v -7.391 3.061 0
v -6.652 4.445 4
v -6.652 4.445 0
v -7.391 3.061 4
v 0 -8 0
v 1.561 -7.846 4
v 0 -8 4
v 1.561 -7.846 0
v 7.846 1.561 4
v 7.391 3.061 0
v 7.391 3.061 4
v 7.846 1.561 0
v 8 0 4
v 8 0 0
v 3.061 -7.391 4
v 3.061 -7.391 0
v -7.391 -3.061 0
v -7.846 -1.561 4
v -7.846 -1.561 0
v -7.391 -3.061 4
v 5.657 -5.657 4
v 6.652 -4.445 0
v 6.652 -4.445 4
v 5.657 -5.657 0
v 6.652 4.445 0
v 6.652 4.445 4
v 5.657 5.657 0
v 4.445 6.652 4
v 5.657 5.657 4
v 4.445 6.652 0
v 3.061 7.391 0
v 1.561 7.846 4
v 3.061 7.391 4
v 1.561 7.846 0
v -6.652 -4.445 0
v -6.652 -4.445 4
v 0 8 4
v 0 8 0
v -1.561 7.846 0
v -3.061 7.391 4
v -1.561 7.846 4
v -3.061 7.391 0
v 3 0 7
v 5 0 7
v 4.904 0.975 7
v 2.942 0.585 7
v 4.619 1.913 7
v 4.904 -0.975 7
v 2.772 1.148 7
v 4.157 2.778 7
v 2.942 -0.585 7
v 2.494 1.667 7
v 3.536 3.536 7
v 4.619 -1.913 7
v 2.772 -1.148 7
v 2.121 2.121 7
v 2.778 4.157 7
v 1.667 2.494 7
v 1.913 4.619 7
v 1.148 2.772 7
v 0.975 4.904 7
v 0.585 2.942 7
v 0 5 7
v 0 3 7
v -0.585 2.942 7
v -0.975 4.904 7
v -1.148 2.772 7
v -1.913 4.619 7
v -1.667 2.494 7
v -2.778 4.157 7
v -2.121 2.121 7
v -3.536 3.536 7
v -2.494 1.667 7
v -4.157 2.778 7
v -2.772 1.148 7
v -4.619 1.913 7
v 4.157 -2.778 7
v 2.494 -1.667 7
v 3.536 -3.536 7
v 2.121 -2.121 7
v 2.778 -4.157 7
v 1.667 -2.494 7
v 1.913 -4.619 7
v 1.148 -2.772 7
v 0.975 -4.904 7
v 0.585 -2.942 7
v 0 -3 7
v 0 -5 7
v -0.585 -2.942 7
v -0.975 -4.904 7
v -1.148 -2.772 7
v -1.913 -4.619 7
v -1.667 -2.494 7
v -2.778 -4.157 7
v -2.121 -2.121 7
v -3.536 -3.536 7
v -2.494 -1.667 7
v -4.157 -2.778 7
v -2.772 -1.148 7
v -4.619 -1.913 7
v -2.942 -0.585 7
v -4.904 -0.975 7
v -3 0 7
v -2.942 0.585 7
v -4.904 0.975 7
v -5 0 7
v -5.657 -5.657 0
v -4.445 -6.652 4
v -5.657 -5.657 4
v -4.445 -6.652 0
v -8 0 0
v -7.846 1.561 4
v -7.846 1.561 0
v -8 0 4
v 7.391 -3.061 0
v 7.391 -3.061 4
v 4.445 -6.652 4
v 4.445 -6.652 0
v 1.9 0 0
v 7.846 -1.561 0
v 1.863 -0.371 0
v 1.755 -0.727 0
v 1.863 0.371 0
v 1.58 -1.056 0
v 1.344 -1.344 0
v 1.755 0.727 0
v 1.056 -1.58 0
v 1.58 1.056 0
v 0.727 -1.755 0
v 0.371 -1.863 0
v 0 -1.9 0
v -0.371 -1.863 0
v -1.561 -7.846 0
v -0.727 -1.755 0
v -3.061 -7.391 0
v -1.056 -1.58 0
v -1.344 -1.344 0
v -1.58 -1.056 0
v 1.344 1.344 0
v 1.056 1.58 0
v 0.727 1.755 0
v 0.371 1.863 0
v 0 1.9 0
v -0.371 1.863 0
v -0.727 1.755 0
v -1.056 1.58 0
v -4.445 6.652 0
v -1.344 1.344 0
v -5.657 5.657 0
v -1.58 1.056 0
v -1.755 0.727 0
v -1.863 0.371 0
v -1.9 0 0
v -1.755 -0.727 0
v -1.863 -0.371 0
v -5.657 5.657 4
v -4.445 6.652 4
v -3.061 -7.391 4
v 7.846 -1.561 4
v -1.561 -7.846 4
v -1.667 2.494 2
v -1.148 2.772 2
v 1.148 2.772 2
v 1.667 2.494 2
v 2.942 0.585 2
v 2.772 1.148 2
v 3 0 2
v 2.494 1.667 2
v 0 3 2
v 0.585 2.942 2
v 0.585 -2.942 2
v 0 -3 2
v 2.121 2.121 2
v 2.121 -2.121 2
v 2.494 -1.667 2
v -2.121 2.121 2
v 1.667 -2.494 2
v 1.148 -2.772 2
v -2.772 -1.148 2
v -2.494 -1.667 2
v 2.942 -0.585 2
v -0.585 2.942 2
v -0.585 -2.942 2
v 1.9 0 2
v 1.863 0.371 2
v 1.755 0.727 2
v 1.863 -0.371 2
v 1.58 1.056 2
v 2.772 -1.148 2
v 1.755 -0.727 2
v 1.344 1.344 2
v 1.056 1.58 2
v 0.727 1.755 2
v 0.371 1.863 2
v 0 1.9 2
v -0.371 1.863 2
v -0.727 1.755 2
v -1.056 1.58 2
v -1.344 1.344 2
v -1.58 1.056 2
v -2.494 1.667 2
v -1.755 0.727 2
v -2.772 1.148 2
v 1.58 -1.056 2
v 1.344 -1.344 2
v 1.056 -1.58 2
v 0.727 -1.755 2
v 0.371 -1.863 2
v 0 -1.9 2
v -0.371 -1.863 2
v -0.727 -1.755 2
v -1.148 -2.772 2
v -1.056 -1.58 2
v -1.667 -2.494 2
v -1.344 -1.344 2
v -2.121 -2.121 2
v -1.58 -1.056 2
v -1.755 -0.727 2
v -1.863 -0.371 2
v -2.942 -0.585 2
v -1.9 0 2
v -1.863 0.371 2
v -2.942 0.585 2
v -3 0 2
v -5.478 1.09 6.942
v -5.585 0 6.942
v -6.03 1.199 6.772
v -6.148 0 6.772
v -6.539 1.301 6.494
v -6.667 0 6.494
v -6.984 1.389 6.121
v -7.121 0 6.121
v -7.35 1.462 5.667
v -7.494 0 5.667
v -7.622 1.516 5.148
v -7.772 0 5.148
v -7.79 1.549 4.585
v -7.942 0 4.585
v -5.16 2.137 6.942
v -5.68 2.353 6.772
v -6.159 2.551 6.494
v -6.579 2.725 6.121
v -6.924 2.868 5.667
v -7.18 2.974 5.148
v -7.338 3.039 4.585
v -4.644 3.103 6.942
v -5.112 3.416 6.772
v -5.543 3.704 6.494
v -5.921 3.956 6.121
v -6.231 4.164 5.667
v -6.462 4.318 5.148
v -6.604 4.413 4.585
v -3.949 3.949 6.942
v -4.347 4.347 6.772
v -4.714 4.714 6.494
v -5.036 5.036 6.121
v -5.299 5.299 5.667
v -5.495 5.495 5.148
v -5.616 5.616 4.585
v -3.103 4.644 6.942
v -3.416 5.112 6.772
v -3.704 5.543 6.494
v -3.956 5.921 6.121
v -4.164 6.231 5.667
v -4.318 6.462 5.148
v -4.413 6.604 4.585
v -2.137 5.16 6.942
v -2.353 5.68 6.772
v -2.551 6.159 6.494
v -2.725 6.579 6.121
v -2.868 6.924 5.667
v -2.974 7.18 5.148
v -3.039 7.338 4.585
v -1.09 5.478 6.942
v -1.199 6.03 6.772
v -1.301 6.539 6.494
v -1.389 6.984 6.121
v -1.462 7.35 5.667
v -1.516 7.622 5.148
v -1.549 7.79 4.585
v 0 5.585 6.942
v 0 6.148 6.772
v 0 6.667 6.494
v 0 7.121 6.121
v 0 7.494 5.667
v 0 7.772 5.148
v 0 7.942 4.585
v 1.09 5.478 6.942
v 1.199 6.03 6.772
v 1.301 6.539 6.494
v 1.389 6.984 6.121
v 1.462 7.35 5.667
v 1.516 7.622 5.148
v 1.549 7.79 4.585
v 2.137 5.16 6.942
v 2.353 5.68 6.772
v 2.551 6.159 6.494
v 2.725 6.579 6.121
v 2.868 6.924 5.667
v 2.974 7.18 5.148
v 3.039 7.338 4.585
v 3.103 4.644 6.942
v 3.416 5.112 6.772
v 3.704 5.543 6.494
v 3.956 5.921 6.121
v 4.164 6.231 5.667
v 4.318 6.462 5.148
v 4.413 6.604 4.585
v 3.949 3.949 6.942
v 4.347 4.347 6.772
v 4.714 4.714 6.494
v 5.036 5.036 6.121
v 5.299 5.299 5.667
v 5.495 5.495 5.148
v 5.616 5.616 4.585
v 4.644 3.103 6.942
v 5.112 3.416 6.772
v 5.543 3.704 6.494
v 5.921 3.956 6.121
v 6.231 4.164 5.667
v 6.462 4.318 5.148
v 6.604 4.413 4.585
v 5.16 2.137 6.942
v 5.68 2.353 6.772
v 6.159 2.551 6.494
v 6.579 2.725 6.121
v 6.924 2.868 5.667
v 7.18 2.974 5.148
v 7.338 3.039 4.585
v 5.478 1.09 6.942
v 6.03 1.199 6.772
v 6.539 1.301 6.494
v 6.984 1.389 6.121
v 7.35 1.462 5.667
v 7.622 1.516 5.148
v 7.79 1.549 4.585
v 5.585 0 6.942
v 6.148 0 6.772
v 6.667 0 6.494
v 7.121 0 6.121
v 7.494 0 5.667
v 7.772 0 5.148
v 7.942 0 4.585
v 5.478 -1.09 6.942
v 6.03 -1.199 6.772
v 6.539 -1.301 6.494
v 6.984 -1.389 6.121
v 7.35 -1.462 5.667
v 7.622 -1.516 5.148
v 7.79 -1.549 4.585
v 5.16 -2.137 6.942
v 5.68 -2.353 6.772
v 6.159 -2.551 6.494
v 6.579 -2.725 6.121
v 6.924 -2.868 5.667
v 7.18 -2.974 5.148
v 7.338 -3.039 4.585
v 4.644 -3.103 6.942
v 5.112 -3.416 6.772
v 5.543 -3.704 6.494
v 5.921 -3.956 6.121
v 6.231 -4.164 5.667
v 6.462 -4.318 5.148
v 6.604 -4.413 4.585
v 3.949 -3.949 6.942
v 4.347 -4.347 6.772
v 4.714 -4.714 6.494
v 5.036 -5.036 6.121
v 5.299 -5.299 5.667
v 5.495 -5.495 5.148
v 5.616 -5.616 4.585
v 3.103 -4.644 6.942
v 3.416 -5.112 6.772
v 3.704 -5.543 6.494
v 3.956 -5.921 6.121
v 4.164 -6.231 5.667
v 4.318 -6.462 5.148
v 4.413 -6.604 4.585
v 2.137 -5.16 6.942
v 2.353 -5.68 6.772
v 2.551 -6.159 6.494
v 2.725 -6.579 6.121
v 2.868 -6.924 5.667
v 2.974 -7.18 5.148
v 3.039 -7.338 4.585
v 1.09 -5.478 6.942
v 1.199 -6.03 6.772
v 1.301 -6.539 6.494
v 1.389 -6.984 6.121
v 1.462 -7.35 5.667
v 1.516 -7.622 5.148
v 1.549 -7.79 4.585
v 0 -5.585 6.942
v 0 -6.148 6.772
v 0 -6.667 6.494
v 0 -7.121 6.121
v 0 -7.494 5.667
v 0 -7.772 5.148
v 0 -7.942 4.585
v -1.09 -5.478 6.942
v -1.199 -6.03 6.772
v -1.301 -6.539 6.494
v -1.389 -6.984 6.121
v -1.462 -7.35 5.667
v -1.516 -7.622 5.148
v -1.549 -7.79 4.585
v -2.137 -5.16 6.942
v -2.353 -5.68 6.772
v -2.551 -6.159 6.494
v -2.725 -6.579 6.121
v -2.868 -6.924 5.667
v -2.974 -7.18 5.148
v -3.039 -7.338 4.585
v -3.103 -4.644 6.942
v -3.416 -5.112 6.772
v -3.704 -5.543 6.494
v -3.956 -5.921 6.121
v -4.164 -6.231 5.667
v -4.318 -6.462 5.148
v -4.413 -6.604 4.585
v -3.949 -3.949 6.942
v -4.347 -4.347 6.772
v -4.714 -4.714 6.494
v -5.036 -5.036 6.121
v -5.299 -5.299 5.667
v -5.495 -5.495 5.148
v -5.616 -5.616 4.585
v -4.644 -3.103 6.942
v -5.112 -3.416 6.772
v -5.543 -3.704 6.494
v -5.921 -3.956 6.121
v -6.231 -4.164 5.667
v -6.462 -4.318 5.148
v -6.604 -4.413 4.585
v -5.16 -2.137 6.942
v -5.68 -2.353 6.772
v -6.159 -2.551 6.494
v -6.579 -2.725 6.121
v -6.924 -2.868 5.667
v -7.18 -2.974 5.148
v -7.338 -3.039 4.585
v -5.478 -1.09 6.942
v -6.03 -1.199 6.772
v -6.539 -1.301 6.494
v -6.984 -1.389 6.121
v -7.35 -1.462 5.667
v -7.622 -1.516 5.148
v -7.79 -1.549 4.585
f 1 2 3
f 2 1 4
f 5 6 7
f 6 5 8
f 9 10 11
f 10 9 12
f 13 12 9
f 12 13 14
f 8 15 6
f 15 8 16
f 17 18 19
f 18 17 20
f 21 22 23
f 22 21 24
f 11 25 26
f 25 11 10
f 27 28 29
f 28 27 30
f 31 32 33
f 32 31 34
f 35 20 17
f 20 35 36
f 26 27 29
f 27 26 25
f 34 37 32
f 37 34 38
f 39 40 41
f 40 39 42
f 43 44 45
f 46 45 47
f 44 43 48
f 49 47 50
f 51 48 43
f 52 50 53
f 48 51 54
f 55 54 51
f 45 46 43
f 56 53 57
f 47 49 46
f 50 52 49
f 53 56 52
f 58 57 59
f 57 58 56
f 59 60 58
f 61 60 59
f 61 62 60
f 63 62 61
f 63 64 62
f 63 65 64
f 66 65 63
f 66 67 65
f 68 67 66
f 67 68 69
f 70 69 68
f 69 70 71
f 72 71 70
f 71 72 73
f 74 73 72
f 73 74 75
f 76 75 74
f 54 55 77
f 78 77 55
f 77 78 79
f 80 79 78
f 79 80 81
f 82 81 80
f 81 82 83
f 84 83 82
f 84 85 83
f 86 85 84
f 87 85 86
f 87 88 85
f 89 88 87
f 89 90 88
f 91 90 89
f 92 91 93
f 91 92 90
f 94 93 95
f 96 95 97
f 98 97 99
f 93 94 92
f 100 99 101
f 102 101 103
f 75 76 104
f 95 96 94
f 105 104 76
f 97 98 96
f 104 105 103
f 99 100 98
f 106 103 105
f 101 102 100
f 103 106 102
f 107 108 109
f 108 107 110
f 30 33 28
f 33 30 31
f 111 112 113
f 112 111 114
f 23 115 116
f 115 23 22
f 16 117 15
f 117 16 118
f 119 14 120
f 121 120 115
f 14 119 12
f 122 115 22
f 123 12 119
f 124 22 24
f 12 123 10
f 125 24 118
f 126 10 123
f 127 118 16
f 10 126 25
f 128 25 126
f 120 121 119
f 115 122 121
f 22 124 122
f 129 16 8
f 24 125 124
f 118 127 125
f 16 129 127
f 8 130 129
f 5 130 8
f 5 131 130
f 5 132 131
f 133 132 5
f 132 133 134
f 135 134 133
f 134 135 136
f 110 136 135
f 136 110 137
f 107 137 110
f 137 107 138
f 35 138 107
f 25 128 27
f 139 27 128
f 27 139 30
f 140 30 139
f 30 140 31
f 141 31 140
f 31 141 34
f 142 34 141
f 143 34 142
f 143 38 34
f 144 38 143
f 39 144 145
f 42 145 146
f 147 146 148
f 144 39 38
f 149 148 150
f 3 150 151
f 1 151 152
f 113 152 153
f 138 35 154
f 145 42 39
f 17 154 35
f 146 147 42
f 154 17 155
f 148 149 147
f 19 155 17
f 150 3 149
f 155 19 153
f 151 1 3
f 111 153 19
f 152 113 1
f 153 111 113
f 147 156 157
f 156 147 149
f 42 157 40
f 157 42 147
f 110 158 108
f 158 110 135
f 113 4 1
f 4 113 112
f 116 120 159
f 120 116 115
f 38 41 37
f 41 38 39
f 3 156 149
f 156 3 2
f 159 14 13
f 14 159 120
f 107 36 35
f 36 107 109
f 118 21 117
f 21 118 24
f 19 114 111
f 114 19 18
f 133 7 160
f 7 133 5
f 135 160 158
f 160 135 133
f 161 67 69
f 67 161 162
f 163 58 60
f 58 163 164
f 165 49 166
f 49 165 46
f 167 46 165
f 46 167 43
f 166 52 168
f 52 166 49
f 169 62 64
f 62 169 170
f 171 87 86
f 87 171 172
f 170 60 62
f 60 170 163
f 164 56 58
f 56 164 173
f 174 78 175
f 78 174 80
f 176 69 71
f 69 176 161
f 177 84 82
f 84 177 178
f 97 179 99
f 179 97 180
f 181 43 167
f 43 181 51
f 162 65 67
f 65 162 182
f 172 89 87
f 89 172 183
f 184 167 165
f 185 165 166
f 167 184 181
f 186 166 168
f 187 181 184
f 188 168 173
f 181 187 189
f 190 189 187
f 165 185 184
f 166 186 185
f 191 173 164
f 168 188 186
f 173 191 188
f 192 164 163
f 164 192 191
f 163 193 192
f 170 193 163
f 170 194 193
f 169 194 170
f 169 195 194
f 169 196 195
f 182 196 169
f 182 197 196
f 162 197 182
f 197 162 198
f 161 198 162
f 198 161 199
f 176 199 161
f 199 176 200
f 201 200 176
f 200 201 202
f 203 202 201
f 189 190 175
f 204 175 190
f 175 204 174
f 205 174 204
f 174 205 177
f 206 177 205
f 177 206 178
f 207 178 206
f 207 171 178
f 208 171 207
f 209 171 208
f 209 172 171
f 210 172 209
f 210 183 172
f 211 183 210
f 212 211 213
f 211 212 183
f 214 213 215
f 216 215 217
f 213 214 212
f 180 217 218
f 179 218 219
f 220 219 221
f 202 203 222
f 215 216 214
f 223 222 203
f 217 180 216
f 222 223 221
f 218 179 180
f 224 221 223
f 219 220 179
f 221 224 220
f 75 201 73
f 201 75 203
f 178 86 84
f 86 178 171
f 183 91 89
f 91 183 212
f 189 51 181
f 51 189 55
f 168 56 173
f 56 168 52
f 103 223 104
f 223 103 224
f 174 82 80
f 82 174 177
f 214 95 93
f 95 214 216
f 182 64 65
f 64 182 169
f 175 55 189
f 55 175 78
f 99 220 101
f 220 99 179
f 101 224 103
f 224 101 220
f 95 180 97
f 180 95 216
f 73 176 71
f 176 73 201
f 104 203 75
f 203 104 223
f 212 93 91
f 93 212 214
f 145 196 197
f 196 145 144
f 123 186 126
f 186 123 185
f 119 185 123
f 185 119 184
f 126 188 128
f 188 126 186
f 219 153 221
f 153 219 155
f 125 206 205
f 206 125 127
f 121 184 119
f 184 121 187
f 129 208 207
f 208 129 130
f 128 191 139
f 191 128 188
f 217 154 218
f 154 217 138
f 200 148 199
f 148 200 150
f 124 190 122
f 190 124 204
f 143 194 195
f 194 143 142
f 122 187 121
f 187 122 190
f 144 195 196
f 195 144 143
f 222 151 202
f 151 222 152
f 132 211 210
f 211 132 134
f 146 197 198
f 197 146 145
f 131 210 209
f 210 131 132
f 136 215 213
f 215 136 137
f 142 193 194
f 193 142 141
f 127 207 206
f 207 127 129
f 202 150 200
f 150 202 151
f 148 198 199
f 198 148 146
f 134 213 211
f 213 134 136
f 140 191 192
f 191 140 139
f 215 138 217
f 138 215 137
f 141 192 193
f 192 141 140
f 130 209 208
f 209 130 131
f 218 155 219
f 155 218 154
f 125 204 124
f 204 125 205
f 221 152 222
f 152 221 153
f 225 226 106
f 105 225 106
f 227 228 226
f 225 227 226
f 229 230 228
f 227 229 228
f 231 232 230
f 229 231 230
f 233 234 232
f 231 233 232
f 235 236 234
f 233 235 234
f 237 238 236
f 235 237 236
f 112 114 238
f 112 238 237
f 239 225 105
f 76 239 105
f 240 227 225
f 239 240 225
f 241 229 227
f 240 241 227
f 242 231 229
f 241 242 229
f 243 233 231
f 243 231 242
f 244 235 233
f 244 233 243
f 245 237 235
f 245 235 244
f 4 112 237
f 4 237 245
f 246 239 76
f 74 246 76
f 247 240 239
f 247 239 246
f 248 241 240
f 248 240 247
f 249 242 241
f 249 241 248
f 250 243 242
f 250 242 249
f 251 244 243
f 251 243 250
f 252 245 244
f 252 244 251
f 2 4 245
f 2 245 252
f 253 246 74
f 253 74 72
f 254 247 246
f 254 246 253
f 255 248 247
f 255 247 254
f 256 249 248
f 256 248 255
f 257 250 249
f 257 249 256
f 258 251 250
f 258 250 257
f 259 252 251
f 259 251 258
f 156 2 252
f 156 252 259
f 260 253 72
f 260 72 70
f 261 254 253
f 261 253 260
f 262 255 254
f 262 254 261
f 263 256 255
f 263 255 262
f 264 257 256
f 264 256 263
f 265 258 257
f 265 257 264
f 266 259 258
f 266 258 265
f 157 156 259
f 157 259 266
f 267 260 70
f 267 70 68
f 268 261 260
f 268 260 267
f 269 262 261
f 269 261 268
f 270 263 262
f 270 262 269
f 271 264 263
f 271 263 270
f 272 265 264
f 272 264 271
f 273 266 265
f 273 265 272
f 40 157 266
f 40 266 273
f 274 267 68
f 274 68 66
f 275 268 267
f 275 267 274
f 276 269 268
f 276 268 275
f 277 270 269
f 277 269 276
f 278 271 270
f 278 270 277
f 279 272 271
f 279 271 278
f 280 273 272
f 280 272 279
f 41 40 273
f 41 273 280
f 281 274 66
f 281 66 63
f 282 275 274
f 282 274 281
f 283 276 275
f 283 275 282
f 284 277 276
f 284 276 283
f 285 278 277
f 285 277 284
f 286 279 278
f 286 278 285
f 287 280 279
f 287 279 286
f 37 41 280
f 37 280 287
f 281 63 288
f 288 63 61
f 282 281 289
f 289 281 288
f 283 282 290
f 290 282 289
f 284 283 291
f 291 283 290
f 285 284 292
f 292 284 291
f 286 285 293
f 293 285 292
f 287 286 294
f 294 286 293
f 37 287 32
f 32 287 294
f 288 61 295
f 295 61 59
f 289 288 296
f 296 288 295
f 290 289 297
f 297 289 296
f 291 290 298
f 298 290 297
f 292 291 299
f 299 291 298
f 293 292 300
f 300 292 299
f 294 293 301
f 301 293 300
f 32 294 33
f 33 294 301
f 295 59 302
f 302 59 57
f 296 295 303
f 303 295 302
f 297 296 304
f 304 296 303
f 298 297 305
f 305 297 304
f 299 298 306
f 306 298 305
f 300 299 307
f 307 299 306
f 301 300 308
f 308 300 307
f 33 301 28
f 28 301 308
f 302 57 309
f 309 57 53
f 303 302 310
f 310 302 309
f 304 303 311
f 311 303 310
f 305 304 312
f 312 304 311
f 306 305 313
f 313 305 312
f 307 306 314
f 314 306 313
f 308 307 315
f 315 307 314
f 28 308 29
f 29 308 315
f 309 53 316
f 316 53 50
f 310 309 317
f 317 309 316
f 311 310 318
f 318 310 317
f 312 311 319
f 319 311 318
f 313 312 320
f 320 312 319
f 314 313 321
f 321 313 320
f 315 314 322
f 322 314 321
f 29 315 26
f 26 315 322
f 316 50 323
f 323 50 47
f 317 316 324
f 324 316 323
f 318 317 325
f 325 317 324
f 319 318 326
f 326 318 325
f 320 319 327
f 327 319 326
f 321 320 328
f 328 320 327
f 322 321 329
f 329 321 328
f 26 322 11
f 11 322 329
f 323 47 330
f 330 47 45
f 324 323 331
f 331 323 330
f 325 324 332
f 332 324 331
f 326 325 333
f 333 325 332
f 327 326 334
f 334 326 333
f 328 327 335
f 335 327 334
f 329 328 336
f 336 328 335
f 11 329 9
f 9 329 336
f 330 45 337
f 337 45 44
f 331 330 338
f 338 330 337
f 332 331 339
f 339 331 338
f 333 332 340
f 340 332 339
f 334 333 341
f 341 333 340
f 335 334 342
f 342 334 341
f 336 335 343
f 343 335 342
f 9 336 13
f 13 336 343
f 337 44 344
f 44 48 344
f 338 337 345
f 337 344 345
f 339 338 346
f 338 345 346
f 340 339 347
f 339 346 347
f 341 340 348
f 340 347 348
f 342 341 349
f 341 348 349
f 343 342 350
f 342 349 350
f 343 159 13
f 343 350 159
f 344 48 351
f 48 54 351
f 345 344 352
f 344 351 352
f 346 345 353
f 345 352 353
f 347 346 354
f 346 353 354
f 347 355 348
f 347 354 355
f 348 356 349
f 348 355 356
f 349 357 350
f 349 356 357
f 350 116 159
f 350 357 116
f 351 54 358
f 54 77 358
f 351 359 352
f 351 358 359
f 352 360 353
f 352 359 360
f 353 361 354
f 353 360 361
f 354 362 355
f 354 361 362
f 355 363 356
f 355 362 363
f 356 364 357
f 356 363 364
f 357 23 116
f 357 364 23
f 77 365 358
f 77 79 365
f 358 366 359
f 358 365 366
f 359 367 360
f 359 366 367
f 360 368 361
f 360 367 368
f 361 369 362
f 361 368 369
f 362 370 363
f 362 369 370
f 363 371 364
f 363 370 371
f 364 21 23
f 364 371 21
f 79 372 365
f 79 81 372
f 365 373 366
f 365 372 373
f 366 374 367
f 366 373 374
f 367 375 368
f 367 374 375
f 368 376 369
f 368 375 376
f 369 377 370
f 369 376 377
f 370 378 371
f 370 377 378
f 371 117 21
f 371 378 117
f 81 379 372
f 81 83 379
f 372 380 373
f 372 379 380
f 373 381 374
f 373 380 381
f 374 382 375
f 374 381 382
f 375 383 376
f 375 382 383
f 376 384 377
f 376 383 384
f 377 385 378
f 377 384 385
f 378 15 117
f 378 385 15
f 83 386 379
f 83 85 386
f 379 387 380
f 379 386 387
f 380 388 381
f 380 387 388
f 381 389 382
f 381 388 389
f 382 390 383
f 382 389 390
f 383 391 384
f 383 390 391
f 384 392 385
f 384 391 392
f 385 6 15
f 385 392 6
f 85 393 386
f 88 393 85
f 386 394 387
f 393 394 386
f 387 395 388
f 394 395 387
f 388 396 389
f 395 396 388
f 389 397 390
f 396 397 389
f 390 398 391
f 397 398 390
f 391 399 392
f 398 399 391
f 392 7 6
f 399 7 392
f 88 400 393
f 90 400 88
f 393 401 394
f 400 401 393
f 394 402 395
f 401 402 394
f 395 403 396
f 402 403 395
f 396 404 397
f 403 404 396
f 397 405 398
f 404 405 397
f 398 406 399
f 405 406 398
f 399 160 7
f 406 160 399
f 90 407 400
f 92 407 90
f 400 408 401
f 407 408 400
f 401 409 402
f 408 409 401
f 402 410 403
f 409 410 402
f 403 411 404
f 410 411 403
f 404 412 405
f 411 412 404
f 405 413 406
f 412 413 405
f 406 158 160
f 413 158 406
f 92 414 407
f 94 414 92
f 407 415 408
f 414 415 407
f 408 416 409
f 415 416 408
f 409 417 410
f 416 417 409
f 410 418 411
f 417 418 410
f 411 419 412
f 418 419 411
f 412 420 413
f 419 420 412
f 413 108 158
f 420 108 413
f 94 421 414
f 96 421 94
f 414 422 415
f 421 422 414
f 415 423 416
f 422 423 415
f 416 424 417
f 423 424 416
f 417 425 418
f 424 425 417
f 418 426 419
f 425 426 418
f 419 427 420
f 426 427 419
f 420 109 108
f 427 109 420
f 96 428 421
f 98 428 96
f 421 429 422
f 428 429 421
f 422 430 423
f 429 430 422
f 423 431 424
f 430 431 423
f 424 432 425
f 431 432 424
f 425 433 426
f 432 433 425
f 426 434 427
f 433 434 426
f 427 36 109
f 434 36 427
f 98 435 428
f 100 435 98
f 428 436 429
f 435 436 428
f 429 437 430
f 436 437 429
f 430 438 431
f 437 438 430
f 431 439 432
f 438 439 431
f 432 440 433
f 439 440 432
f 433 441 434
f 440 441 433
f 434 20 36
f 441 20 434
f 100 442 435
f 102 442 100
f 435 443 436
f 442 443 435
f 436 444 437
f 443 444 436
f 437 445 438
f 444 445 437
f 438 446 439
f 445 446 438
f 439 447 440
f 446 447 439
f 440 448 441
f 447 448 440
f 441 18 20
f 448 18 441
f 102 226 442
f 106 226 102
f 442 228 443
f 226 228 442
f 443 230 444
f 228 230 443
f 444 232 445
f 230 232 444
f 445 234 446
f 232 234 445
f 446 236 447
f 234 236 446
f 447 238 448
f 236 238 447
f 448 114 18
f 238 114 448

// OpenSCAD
// The height of the foot
height = 7;
// The diameter of the foot
diameter = 16;
// The radius of the rounding
roundRadius = 3;

// The diameter of the screw hole
holeDiameter = 6;
// The diameter of the screw
screwDiameter = 3.8;
// The thickness of the base, which the screw is screwed on
holeBaseThickness = 2;


// The number of faces used (detail)
numFaces = 32; // [16,32,64,128]

$fn = numFaces;

difference()
{
    cylinder(h=height, r=diameter/2);
    translate([0,0,holeBaseThickness])
    cylinder(h=height-holeBaseThickness+1, r = holeDiameter/2);
    translate([0,0,-1])
    cylinder(h=holeBaseThickness+2, r = screwDiameter/2);
    roundNegative();
}

module roundNegative()
{
    translate([0,0,height - roundRadius])
    rotate_extrude()
    {
        translate([diameter/2-roundRadius,0,0])
        difference()
        {
            square(roundRadius+1);
            circle(roundRadius);
        }
    }
}
